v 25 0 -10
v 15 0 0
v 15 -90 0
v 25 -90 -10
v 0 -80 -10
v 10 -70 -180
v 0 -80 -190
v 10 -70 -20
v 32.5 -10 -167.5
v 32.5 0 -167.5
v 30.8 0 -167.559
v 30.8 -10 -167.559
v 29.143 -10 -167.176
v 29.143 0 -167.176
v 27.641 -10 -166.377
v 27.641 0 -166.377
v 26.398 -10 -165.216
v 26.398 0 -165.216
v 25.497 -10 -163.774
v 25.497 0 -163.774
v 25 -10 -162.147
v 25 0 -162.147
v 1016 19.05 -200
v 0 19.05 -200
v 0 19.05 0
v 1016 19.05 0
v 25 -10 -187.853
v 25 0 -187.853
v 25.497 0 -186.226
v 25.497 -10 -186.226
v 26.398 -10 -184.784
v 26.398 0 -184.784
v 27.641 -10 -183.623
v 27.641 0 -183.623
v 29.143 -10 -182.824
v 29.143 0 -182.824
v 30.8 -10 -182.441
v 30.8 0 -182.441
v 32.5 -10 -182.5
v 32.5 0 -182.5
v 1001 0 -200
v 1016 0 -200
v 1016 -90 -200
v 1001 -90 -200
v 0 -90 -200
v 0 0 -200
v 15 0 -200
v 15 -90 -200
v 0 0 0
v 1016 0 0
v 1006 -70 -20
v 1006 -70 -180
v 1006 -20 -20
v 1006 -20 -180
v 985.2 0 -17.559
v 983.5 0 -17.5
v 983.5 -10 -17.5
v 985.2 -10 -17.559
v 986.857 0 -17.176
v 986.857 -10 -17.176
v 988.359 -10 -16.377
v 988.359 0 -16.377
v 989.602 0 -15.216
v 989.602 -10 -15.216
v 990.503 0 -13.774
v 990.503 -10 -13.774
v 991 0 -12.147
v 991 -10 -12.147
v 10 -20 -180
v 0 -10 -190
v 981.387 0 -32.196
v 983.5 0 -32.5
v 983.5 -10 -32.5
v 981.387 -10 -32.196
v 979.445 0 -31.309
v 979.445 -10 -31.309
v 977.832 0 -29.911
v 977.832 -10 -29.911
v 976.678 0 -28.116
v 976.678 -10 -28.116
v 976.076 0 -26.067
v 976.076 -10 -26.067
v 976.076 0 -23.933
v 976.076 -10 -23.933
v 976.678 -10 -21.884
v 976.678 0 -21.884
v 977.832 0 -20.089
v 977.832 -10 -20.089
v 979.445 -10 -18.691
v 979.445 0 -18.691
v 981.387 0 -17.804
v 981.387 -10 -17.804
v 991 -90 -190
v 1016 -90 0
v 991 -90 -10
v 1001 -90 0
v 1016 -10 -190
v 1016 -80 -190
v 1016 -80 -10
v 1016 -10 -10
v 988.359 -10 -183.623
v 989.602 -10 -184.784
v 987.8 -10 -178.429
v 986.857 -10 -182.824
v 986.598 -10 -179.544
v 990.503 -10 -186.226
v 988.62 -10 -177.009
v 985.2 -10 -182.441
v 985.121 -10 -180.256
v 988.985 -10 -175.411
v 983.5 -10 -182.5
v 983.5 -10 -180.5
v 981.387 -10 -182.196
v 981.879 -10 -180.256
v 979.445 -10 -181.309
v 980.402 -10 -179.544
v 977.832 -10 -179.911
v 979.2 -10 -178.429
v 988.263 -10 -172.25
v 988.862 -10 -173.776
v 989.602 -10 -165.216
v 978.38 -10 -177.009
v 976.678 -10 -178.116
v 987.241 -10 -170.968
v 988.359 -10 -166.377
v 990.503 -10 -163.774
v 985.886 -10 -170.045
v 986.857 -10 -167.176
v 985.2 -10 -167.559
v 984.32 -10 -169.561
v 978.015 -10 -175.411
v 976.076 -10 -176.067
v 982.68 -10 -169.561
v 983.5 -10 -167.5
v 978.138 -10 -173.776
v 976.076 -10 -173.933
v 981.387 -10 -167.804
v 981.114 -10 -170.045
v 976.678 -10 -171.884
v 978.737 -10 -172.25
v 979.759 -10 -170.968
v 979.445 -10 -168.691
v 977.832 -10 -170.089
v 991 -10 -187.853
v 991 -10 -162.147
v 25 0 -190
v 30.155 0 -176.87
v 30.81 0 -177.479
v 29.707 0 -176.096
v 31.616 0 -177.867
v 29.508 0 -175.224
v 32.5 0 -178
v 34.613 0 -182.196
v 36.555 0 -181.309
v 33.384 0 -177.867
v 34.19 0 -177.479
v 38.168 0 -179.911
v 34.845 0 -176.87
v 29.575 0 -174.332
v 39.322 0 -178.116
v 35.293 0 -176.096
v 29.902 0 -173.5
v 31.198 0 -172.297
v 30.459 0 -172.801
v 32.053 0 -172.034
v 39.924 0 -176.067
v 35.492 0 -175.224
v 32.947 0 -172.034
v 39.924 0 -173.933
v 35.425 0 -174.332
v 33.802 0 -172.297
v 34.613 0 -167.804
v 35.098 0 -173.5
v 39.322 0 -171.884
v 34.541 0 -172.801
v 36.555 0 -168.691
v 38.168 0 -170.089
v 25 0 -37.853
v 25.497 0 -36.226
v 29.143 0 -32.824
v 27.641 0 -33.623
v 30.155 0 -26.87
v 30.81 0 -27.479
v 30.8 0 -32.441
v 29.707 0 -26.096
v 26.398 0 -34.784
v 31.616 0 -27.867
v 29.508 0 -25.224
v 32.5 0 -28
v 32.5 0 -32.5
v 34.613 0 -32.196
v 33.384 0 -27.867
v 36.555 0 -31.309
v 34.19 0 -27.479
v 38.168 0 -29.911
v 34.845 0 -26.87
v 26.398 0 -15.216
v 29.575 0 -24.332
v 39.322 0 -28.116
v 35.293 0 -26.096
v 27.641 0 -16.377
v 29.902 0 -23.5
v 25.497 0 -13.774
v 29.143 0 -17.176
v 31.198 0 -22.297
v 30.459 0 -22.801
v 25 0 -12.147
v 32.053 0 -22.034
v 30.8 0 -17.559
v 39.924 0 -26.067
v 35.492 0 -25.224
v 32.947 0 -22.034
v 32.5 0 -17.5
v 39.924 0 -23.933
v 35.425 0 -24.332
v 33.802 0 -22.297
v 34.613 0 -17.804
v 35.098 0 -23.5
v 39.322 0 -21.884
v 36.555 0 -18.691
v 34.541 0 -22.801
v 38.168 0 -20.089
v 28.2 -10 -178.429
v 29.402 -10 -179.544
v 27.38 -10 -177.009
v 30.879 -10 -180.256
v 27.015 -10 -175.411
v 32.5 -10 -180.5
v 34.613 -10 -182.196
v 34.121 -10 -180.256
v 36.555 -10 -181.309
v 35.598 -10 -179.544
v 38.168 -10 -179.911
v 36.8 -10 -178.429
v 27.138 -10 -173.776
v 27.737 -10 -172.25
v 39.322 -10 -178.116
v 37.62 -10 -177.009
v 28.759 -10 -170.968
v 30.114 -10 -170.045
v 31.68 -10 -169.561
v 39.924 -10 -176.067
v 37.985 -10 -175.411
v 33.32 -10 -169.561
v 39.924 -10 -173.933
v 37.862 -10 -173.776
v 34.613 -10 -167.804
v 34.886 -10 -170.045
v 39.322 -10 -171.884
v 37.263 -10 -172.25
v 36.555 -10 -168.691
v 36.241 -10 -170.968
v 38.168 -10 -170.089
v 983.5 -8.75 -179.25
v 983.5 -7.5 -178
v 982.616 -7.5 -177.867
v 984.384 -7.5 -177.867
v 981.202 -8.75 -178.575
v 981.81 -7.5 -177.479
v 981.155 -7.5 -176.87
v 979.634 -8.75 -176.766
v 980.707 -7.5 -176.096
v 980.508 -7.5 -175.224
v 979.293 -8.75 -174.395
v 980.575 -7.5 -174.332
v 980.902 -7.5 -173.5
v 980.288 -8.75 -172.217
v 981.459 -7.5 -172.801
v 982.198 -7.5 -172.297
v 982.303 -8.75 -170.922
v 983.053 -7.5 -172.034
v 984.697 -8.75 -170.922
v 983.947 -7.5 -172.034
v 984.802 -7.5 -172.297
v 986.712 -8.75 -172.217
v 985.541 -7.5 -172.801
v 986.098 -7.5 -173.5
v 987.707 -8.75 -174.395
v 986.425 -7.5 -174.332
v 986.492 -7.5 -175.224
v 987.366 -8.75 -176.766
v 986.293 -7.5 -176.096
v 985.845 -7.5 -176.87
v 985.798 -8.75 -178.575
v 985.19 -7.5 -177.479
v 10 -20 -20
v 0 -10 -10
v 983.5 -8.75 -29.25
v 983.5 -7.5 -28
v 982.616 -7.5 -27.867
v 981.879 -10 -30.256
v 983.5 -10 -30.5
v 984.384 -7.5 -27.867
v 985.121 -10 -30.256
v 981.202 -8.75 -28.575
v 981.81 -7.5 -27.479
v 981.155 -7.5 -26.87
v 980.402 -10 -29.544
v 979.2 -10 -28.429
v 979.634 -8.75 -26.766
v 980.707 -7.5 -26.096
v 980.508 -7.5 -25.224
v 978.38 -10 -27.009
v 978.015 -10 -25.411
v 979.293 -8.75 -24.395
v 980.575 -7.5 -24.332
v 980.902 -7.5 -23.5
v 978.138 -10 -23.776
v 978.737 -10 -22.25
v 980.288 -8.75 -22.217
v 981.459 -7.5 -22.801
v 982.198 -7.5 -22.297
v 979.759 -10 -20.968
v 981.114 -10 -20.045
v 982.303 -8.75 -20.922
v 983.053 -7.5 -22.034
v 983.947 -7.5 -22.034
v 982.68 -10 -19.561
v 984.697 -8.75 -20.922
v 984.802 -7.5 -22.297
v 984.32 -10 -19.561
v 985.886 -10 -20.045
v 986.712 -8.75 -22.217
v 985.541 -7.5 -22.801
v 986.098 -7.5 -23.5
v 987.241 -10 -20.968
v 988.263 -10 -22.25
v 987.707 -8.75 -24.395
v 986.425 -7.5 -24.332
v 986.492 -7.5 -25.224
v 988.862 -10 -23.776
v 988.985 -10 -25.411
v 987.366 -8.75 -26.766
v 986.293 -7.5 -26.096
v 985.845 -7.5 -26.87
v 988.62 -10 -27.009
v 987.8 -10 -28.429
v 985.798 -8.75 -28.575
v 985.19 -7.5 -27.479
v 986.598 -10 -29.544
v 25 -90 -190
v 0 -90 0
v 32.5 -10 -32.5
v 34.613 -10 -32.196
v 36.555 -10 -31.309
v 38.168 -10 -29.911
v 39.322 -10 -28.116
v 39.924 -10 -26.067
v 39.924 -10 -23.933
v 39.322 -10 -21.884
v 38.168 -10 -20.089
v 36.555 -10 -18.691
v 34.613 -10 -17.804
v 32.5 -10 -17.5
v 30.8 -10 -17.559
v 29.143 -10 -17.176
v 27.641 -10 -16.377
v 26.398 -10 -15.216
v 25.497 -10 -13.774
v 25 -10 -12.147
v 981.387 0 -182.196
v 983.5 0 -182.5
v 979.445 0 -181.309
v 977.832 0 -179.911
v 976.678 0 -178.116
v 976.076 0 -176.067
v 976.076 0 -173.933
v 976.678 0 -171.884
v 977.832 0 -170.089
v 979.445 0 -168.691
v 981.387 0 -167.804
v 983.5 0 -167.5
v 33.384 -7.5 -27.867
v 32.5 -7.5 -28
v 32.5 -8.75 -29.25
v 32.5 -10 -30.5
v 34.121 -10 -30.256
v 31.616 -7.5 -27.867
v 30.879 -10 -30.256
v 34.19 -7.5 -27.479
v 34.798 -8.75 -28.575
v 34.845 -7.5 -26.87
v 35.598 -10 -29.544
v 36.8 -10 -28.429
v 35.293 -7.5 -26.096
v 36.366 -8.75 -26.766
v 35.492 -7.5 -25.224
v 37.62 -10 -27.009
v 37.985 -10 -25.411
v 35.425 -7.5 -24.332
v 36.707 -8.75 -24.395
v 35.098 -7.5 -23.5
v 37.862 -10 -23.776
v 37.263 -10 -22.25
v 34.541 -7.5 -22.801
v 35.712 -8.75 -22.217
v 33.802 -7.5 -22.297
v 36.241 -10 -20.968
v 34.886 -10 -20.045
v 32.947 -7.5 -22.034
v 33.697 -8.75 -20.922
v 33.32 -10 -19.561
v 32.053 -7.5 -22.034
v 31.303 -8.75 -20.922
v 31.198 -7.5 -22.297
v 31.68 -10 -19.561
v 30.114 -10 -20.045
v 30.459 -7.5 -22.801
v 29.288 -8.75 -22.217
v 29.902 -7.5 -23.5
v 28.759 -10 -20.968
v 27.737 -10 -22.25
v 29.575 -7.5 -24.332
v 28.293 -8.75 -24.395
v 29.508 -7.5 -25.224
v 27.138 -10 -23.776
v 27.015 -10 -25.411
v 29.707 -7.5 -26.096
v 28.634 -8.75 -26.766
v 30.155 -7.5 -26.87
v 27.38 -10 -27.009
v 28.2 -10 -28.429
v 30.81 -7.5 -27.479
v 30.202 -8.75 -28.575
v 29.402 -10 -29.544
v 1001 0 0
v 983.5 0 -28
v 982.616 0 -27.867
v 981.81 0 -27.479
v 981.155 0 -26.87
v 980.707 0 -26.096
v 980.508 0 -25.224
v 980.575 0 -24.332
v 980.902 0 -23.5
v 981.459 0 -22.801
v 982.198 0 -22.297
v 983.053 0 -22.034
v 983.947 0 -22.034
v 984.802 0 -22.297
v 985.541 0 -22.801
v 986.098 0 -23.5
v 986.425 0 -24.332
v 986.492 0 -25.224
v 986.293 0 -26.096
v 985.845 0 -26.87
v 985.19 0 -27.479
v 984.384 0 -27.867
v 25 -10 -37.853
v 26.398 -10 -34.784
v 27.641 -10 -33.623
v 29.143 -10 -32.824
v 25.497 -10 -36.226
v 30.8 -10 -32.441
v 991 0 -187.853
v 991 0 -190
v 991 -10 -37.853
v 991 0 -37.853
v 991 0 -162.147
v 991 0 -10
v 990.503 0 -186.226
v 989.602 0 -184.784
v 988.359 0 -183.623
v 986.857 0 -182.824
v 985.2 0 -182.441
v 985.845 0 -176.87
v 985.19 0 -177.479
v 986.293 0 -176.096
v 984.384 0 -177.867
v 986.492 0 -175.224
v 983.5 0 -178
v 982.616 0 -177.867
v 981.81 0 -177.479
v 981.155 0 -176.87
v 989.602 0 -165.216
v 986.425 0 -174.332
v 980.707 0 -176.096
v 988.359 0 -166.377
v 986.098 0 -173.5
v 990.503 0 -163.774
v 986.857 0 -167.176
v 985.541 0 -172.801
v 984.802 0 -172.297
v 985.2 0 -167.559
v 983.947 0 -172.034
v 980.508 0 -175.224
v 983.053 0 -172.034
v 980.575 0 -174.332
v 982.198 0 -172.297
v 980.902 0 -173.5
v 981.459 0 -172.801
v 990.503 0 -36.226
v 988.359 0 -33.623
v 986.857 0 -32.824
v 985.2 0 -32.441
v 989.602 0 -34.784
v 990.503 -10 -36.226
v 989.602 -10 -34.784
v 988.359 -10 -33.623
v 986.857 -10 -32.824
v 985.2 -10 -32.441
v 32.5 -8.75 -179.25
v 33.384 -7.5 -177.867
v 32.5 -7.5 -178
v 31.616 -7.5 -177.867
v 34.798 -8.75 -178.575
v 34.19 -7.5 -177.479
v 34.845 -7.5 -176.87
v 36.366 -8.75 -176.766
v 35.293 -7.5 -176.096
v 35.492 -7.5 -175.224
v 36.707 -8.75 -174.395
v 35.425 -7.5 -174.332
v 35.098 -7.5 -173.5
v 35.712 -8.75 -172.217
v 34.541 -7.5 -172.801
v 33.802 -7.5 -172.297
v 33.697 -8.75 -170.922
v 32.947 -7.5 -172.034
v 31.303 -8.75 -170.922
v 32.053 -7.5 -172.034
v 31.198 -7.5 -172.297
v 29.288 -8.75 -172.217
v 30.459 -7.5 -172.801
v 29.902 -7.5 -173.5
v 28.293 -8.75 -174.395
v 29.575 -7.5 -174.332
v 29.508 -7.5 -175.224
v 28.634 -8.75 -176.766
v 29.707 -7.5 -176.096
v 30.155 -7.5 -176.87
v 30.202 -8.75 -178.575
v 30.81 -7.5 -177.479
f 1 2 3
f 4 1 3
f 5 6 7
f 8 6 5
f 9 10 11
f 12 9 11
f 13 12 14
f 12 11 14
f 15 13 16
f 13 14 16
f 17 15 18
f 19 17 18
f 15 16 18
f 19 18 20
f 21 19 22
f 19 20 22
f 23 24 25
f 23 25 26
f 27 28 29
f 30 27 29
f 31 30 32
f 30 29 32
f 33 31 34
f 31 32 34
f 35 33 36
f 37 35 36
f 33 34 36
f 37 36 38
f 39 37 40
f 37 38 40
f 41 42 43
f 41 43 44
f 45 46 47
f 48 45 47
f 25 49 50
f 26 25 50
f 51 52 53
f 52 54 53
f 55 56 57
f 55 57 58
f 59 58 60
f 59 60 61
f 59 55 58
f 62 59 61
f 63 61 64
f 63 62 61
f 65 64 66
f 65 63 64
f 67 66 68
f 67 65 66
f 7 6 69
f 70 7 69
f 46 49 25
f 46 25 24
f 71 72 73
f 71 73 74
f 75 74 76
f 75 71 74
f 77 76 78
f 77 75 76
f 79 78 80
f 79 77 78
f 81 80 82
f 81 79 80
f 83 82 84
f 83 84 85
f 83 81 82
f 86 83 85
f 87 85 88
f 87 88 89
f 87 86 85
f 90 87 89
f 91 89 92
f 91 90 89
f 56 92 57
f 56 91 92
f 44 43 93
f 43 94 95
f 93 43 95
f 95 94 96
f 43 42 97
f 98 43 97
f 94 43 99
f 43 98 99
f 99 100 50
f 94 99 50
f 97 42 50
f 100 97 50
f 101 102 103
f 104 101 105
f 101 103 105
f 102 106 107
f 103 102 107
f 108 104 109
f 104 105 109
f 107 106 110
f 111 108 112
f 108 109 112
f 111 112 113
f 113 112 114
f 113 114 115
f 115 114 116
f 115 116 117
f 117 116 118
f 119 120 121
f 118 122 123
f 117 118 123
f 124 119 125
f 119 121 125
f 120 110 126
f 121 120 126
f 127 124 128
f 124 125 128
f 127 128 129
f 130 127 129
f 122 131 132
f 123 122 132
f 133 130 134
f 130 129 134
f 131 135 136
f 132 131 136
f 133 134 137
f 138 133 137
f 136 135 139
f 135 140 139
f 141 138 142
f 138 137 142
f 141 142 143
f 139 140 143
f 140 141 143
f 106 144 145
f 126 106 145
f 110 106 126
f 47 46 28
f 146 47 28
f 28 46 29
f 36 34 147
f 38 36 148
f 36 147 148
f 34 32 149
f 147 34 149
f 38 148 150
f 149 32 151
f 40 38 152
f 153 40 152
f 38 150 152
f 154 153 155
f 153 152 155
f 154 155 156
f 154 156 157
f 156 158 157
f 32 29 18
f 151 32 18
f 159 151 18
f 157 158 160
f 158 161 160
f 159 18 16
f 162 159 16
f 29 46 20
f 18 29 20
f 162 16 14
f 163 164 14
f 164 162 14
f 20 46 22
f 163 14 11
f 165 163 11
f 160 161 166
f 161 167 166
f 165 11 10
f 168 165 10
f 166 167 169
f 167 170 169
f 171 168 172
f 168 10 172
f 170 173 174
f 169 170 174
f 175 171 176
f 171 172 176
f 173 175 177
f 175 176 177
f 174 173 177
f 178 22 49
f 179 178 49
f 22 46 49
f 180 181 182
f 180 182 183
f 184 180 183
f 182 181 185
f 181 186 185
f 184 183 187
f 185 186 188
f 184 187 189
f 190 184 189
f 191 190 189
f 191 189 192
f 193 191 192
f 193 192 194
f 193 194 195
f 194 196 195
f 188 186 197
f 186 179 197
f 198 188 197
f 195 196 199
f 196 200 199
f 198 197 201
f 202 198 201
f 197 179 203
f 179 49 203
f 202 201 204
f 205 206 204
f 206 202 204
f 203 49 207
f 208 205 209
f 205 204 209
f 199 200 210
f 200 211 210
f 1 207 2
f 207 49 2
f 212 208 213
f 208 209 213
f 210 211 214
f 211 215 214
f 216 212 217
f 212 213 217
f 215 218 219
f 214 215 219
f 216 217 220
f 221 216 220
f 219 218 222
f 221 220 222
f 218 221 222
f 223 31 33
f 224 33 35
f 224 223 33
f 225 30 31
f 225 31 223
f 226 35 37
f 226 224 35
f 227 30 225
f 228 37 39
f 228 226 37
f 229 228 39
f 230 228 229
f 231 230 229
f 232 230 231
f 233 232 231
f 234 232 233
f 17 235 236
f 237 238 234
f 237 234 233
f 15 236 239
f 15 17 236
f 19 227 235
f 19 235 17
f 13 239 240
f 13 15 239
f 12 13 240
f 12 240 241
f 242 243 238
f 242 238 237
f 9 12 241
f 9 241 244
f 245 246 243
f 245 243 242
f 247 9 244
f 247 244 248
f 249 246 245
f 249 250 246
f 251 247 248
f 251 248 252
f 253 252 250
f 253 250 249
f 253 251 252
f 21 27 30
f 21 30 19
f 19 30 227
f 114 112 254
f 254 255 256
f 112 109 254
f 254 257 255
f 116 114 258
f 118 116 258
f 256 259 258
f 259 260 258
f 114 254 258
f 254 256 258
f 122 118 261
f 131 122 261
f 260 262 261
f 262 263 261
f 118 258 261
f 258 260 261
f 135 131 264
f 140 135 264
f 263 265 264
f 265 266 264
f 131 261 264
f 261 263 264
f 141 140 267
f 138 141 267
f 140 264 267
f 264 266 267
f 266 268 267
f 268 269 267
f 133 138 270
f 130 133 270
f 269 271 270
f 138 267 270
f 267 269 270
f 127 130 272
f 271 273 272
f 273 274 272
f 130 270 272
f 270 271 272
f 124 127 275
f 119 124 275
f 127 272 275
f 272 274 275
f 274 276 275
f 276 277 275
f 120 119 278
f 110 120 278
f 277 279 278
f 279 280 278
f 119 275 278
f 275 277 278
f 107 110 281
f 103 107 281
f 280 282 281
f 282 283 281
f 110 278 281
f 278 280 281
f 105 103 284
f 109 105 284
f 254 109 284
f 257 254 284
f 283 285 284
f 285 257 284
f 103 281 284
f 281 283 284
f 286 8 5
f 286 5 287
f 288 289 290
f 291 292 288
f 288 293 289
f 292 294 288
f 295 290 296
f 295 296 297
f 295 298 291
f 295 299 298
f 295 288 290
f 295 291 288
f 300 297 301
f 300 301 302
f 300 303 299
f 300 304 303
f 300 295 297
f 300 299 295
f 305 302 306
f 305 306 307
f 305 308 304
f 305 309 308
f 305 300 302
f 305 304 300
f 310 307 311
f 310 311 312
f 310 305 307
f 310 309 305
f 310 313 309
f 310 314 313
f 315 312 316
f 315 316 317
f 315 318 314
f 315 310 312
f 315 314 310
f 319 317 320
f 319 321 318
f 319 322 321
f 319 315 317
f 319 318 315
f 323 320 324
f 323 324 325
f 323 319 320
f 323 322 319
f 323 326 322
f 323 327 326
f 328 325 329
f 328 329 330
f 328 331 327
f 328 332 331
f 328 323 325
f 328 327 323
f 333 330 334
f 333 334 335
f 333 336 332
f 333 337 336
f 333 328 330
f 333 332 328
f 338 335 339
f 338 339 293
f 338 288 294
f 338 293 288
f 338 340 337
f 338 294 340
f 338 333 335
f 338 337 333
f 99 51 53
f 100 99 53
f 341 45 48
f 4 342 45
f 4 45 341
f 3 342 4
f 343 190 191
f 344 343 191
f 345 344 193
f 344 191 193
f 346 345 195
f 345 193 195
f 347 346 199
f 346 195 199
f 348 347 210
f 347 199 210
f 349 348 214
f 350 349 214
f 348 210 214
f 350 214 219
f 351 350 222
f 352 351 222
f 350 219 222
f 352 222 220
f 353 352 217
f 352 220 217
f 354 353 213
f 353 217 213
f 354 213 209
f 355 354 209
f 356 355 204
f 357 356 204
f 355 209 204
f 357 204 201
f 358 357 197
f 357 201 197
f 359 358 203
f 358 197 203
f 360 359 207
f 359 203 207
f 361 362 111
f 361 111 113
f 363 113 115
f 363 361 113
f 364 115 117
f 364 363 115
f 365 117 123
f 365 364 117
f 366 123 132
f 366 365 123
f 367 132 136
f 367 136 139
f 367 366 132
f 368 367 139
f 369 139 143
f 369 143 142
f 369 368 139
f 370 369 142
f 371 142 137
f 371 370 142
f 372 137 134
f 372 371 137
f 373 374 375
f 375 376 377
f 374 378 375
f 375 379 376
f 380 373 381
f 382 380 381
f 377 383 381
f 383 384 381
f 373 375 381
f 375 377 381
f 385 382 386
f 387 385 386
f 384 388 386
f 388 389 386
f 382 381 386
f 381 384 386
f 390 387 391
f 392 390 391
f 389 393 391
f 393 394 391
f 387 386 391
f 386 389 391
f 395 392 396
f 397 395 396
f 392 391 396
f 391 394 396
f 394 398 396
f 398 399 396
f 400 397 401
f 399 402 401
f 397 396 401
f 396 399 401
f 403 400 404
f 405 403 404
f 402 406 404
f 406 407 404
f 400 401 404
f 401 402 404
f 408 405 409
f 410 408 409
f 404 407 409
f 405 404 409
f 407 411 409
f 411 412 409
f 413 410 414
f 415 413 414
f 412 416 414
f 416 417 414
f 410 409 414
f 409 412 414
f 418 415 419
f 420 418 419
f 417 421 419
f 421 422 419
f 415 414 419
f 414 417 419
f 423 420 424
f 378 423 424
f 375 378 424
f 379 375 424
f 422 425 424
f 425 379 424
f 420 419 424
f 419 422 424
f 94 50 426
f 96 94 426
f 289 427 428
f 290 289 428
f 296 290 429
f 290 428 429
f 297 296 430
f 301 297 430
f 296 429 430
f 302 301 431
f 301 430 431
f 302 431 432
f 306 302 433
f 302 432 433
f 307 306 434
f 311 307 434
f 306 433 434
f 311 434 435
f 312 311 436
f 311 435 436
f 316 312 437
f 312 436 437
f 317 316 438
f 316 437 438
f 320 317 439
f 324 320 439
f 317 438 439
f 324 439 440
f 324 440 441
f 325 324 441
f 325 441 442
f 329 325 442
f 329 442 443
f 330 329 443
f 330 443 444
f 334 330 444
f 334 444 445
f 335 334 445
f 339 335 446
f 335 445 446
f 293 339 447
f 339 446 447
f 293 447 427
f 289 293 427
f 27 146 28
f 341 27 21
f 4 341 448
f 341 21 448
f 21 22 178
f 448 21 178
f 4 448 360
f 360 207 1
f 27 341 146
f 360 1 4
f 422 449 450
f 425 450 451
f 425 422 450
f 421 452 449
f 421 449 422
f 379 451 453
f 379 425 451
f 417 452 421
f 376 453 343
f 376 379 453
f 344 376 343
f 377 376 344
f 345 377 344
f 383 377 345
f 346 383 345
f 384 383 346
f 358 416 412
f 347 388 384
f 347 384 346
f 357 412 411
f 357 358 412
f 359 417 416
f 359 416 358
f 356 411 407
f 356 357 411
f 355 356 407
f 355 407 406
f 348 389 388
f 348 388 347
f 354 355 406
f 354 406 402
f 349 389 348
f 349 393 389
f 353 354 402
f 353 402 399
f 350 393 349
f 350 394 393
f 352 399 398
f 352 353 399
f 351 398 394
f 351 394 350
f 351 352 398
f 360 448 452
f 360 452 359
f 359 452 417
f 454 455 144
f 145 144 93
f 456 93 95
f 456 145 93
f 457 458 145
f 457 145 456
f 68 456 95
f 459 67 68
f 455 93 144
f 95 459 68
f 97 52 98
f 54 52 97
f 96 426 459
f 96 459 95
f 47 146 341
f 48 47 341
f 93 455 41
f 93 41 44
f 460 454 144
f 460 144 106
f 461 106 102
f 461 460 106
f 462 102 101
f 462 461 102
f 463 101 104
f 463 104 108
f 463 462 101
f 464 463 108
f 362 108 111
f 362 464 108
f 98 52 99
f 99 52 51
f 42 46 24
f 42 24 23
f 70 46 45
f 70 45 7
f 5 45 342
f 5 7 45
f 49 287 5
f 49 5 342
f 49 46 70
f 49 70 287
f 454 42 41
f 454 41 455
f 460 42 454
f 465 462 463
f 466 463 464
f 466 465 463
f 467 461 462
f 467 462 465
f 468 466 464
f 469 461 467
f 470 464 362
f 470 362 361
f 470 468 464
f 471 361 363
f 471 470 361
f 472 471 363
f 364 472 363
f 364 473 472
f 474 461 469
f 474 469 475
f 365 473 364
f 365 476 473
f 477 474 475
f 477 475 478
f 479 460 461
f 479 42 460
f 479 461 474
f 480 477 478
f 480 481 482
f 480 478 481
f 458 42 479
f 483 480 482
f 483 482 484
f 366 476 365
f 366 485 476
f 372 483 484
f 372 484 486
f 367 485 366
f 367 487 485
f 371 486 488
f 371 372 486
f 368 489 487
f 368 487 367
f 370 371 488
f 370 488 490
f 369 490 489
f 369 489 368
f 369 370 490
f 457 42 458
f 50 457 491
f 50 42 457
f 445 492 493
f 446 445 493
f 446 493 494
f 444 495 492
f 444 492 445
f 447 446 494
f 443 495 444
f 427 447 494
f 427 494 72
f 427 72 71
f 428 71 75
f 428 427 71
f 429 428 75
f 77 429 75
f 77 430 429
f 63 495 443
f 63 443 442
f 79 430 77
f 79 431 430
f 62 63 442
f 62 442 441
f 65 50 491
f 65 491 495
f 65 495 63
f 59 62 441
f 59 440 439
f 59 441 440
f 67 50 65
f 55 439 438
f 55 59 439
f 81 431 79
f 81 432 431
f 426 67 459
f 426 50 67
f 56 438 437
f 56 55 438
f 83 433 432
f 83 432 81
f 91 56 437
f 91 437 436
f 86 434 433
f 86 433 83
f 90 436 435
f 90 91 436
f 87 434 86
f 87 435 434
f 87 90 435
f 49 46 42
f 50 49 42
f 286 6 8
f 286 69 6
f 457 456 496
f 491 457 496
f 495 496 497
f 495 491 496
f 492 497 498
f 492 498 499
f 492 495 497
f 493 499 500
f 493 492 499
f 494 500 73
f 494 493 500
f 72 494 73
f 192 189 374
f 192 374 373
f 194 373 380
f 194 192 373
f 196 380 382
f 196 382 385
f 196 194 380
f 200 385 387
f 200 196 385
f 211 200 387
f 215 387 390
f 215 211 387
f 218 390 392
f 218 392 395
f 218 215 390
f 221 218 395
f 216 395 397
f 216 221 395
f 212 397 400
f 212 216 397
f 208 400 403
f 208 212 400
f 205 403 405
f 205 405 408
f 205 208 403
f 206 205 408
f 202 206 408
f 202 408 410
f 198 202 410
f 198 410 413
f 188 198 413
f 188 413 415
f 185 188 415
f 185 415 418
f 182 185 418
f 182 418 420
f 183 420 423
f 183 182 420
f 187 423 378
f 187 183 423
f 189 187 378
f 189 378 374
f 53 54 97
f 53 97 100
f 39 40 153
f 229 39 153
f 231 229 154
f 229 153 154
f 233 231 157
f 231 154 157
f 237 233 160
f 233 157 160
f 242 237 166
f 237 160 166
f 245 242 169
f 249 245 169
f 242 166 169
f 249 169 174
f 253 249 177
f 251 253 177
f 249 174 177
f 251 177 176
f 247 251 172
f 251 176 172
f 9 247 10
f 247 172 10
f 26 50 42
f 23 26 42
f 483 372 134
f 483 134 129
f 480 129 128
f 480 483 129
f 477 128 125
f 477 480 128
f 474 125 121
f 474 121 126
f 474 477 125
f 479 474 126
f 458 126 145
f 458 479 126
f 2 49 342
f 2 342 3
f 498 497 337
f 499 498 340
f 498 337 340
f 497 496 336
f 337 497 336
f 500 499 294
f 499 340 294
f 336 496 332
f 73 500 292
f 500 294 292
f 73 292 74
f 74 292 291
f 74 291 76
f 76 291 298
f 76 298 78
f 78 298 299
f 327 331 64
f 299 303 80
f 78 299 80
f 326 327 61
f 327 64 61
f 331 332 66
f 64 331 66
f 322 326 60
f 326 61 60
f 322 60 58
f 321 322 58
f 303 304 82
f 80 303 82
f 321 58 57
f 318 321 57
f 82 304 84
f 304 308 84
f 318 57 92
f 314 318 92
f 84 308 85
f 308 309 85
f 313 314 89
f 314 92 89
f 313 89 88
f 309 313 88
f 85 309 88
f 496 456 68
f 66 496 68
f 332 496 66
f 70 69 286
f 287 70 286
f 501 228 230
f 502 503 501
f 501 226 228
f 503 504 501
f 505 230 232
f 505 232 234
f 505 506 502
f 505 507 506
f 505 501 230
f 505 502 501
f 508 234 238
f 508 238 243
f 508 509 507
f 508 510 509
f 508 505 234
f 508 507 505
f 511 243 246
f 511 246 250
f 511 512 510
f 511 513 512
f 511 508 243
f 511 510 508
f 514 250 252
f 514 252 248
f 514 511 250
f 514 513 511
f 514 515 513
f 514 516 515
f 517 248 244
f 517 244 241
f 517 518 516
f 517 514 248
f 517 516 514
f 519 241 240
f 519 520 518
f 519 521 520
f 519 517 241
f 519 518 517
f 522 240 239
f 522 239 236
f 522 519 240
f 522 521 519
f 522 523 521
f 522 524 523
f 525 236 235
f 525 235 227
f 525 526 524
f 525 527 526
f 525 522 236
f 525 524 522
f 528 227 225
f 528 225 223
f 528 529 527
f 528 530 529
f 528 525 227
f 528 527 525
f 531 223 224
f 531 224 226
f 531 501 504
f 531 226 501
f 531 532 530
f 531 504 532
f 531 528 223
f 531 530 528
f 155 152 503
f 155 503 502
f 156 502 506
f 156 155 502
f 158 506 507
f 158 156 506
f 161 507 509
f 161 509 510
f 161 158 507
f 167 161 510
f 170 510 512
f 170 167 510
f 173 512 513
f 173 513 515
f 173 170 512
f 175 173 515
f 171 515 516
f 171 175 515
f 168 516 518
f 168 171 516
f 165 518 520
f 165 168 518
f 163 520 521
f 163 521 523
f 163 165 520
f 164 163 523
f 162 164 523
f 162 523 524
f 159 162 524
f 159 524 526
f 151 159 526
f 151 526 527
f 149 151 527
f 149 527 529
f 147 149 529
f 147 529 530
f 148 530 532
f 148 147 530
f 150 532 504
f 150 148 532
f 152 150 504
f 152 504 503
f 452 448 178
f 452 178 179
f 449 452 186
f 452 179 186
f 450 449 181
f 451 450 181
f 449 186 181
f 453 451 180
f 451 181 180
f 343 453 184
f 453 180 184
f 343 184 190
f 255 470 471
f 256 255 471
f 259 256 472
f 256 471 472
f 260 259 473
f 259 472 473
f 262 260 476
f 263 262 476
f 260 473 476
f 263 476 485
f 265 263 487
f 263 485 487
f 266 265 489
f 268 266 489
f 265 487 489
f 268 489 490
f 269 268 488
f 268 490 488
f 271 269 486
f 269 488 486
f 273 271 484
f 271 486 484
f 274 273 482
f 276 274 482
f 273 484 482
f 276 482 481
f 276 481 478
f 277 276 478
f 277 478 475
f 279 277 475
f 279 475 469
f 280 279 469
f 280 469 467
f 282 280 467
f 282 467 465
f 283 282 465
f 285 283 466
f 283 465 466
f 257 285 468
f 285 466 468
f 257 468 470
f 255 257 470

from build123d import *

# Parameters (mm, degrees)
SKETCH1_W             = 1016
SKETCH1_H             = 200
BOSS_EXTRUDE1_DEPTH   = 19.05
SKETCH2_W             = 25
SKETCH2_H             = 200
BOSS_EXTRUDE3_DEPTH   = 90
SKETCH8_W             = 180
SKETCH8_H             = 70
CUT_EXTRUDE5_DEPTH    = 10
CHAMFER2_SIZE         = 10
SKETCH10_R            = 3
BOSS_EXTRUDE6_DEPTH   = 10
BOSS_EXTRUDE6_2_DEPTH = 10
CHAMFER4_SIZE         = 2.5
CHAMFER5_SIZE         = 10


with BuildPart() as part:
    # Sketch1 → Boss-Extrude1 (new body)
    with BuildSketch(Plane(origin=(0, 0, 0), x_dir=(1, 0, 0), z_dir=(0, 1, 0))):
        with Locations((508, 100)):
            Rectangle(SKETCH1_W, SKETCH1_H)
    extrude(amount=BOSS_EXTRUDE1_DEPTH)


with BuildPart() as body_2:
    # Sketch2 → Boss-Extrude3 (new body)
    with BuildSketch(Plane.XZ):
        with Locations((12.5, -100)):
            Rectangle(SKETCH2_W, SKETCH2_H)
    extrude(amount=BOSS_EXTRUDE3_DEPTH)

    # Sketch8 → Cut-Extrude5 (cut)
    with BuildSketch(Plane.ZY):
        with Locations((-100, -45)):
            Rectangle(SKETCH8_W, SKETCH8_H)
    extrude(amount=-CUT_EXTRUDE5_DEPTH, mode=Mode.SUBTRACT)

    # Chamfer2
    chamfer2_edges = [body_2.edges().sort_by_distance(p)[0] for p in [
        (10, -80, -100),
        (10, -45, -190),
        (10, -10, -100),
        (10, -45, -10),
    ]]
    chamfer(chamfer2_edges, length=CHAMFER2_SIZE - 0.0001)  # a hair under: the kernel refuses the full size


with BuildPart() as body_3:
    # Sketch10 → Boss-Extrude6 (new body)
    with BuildSketch(Plane.XZ):
        with BuildLine():
            Line((25, -175), (25, -187.853138356))
            ThreePointArc((25, -187.853138356), (27.641328746, -183.623268319), (32.5, -182.5))
            ThreePointArc((32.5, -182.5), (40, -175), (32.5, -167.5))
            ThreePointArc((32.5, -167.5), (27.641328746, -166.376731681), (25, -162.146861644))
            Line((25, -162.146861644), (25, -175))
        make_face()
        with Locations(Location((32.5, -175, 0), (0, 0, 270))):
            Circle(SKETCH10_R, mode=Mode.SUBTRACT)
    extrude(amount=BOSS_EXTRUDE6_DEPTH)


with BuildPart() as body_4:
    # Sketch10 → Boss-Extrude6 2 (new body)
    with BuildSketch(Plane.XZ):
        with BuildLine():
            Line((25, -12.146861644), (25, -25))
            Line((25, -25), (25, -37.853138356))
            ThreePointArc((25, -37.853138356), (27.641328746, -33.623268319), (32.5, -32.5))
            ThreePointArc((32.5, -32.5), (40, -25), (32.5, -17.5))
            ThreePointArc((32.5, -17.5), (27.641328746, -16.376731681), (25, -12.146861644))
        make_face()
        with Locations(Location((32.5, -25, 0), (0, 0, 270))):
            Circle(SKETCH10_R, mode=Mode.SUBTRACT)
    extrude(amount=BOSS_EXTRUDE6_2_DEPTH)


with BuildPart() as body_2_1:
    add(body_2.part)

    # Combine2: union body 4, body 3
    add(body_4.part)
    add(body_3.part)

    # Chamfer4
    chamfer4_edges = [body_2_1.edges().sort_by_distance(p)[0] for p in [
        (32.5, -10, -22),
        (32.5, -10, -172),
    ]]
    chamfer(chamfer4_edges, length=CHAMFER4_SIZE)

    # Chamfer5
    chamfer5_edges = [body_2_1.edges().sort_by_distance(p)[0] for p in [
        (25, -45, 0),
        (25, -45, -200),
    ]]
    chamfer(chamfer5_edges, length=CHAMFER5_SIZE)


with BuildPart() as body_3_2:
    # Mirror1: mirrored copy
    add(body_2_1.part.mirror(Plane.ZY.offset(-508)))


solid = Compound([part.part, body_2_1.part, body_3_2.part])
